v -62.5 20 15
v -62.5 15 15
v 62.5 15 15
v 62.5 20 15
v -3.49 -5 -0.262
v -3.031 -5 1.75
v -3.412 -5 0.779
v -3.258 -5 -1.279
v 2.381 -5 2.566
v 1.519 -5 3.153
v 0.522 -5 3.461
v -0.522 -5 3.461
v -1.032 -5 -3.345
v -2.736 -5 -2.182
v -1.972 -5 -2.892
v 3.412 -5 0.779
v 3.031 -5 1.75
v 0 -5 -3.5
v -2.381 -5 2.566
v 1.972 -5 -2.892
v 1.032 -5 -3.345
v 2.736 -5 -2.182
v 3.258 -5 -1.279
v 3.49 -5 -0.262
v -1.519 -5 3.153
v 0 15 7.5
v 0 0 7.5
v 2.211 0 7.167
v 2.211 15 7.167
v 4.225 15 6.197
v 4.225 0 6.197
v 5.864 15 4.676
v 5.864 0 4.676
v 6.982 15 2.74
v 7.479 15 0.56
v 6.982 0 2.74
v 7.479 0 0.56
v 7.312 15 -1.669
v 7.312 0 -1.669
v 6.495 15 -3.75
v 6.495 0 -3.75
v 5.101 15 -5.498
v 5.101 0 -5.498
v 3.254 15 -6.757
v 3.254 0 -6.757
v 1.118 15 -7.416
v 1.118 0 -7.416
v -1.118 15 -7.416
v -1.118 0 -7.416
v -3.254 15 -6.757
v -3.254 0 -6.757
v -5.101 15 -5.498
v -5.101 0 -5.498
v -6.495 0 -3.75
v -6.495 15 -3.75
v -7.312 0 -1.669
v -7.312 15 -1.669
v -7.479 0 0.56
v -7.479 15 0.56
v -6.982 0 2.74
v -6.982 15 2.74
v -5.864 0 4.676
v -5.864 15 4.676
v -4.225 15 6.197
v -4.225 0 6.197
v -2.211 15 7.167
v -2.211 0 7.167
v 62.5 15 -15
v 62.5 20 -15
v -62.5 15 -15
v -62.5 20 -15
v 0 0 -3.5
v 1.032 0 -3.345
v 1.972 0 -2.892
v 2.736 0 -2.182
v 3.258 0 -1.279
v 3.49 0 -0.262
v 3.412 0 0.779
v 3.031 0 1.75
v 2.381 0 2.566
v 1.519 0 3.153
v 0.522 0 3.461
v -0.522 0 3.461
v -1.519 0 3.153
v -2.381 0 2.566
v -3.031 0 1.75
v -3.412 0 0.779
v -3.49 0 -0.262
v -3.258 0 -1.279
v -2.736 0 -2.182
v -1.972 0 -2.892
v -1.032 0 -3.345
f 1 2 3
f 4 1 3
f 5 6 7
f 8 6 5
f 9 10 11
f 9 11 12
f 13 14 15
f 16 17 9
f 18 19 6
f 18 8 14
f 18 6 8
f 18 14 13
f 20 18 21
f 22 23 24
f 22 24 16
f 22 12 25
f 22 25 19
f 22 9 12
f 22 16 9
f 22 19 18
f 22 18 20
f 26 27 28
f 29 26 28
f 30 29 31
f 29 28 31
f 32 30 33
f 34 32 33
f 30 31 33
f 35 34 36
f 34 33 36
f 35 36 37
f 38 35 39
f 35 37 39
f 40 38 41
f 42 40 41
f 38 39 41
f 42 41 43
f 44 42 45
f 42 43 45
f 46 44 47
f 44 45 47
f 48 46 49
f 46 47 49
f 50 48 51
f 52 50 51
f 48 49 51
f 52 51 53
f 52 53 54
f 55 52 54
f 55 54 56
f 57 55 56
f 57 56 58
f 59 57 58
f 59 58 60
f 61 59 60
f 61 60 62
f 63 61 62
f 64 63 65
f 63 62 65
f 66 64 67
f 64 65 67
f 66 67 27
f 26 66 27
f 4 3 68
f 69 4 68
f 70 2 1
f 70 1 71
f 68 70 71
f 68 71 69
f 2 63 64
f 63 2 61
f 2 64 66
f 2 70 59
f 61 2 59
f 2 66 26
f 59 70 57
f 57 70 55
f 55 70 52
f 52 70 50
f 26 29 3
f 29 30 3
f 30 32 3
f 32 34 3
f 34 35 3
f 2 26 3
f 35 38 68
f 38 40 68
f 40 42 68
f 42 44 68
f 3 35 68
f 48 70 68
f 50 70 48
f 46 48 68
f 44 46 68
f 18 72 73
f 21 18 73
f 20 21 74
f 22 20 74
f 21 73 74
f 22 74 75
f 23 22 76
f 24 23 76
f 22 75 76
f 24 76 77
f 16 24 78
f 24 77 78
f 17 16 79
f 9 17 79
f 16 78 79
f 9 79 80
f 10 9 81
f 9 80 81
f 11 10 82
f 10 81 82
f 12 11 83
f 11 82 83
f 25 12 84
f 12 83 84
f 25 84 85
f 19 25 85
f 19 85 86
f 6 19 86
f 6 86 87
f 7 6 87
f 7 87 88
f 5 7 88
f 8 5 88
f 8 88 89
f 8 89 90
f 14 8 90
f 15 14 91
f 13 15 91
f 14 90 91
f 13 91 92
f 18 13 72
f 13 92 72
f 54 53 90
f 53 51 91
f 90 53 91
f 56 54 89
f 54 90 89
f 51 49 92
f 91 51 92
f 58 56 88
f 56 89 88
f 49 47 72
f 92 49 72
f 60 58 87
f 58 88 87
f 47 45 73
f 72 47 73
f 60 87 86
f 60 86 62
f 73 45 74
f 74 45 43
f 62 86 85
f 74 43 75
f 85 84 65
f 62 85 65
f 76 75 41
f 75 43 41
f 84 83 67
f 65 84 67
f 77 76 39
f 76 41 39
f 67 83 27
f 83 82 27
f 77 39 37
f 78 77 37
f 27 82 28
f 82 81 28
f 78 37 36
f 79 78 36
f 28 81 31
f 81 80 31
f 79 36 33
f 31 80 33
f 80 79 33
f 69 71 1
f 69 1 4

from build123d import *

# Parameters (mm, degrees)
SKETCH1_R           = 7.5
BOSS_EXTRUDE1_DEPTH = 15
SKETCH2_W           = 125
SKETCH2_H           = 30
BOSS_EXTRUDE2_DEPTH = 5
SKETCH3_R           = 3.5
BOSS_EXTRUDE3_DEPTH = 5


with BuildPart() as part:
    # Sketch1 → Boss-Extrude1 (new body)
    with BuildSketch(Plane(origin=(0, 0, 0), x_dir=(1, 0, 0), z_dir=(0, 1, 0))):
        with Locations(Location((0, 0, 0), (0, 0, 270))):
            Circle(SKETCH1_R)
    extrude(amount=BOSS_EXTRUDE1_DEPTH)

    # Sketch2 → Boss-Extrude2 (add)
    with BuildSketch(Plane(origin=(0, 15, 0), x_dir=(1, 0, 0), z_dir=(0, 1, 0))):
        Rectangle(SKETCH2_W, SKETCH2_H)
    extrude(amount=BOSS_EXTRUDE2_DEPTH)

    # Sketch3 → Boss-Extrude3 (add)
    with BuildSketch(Plane.XZ):
        with Locations(Location((0, 0, 0), (0, 0, 270))):
            Circle(SKETCH3_R)
    extrude(amount=BOSS_EXTRUDE3_DEPTH)


solid = part.part
